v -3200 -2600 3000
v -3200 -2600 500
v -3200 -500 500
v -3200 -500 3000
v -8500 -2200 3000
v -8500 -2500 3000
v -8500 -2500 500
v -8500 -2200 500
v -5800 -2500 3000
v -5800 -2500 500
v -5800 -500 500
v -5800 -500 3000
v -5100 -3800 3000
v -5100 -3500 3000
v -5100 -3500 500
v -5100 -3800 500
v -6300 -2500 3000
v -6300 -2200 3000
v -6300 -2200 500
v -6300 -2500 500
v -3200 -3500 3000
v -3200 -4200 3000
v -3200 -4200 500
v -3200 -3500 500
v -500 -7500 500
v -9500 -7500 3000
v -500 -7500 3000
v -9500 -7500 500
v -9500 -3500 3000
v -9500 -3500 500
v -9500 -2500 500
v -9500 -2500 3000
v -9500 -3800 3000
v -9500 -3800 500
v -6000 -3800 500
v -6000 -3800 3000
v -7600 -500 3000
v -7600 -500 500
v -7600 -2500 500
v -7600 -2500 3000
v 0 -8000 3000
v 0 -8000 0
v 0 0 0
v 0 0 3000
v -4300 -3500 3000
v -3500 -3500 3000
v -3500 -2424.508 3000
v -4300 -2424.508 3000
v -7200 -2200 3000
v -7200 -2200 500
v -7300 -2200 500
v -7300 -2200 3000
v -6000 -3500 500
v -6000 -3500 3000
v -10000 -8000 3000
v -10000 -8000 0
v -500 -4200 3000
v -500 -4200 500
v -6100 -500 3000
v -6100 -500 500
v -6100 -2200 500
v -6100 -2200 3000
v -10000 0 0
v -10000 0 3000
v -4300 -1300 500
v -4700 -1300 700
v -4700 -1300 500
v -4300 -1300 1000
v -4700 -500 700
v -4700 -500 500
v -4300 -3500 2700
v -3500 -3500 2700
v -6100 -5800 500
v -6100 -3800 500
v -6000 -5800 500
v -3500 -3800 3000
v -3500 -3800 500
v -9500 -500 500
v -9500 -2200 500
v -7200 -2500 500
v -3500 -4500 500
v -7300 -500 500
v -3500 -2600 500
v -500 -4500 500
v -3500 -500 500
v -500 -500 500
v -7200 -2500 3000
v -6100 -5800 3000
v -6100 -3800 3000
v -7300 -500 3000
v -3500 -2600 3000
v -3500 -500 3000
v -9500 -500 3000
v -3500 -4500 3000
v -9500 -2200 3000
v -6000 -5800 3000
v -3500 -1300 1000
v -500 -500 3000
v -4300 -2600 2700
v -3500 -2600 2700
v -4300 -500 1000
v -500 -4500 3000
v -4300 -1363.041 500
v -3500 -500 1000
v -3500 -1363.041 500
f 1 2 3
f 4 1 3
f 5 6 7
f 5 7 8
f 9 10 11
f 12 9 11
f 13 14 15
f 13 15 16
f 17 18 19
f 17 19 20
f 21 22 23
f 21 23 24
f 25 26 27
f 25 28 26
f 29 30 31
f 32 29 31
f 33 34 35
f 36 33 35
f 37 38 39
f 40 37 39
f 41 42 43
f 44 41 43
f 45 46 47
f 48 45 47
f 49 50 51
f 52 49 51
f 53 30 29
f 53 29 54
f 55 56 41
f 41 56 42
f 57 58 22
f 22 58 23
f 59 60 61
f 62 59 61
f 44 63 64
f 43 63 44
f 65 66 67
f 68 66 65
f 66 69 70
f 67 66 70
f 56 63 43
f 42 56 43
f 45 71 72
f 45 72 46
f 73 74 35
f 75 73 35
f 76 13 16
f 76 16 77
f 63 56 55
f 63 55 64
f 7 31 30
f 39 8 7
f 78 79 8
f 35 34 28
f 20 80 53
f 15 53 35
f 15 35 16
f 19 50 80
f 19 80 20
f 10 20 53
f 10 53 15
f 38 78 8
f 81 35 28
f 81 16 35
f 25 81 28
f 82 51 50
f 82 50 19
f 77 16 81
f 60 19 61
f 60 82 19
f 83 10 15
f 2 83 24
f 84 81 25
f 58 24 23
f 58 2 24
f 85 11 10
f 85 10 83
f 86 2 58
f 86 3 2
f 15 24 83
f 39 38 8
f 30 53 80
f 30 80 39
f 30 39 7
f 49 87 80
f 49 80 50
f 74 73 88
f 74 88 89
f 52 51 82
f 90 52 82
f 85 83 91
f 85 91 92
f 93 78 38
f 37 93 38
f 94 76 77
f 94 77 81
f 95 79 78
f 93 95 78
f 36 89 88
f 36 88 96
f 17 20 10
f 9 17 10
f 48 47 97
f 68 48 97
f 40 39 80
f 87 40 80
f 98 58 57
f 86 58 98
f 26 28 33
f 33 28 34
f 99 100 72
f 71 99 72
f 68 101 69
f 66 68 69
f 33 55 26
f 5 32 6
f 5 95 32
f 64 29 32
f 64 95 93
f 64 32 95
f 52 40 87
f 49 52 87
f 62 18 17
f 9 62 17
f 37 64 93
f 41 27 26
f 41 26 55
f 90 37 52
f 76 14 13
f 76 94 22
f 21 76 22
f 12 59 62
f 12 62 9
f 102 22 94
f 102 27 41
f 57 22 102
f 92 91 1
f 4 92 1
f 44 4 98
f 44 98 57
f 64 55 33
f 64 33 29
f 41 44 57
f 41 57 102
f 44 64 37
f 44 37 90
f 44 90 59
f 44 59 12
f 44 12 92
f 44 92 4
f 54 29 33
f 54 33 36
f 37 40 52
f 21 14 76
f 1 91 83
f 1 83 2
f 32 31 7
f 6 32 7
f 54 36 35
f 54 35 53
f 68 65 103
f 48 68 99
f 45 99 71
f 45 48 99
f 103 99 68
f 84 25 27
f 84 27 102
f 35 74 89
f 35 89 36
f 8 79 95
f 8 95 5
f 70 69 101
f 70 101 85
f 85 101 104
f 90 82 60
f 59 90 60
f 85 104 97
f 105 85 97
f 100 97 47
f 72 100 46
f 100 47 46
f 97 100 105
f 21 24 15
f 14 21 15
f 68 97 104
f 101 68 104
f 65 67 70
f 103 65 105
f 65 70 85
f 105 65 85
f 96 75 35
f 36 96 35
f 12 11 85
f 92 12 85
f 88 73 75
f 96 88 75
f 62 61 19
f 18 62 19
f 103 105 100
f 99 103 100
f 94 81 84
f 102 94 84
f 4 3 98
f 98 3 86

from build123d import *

# Parameters (mm, degrees)
F0_W      = 10000
F0_H      = 8000
F1_DEPTH  = 3000
F2_T      = -500
F3_W      = 3500
F3_H      = 300
F3_W_2    = 300
F3_H_2    = 2100
F3_W_3    = 1000
F4_DEPTH  = 2500
F5_W      = 100
F5_H      = 2000
F6_DEPTH  = 2500
F8_DEPTH  = 800
F10_DEPTH = 800


with BuildPart() as f1:
    # F0 (on Top) → F1 (new body)
    with BuildSketch(Plane.XY):
        with Locations((-5000, -4000)):
            Rectangle(F0_W, F0_H)
    extrude(amount=F1_DEPTH)

    # F2
    f2_openings = [f1.faces().sort_by_distance(p)[0] for p in [
        (-5000, -4000, 3000),
    ]]
    offset(amount=F2_T, openings=f2_openings)

    # F3 (on face) → F4 (join, through all)
    with BuildSketch(Plane.XY.offset(500)):
        with Locations((-7750, -3650)):
            Rectangle(F3_W, F3_H)
        Polygon((-3500, -4500), (-500, -4500), (-500, -4200), (-3200, -4200), (-3200, -3500), (-5100, -3500), (-5100, -3800), (-3500, -3800), align=None)
        with Locations((-3350, -1550)):
            Rectangle(F3_W_2, F3_H_2)
        Polygon((-7300, -500), (-7600, -500), (-7600, -2500), (-7200, -2500), (-7200, -2200), (-7300, -2200), align=None)
        with Locations((-9000, -2350)):
            Rectangle(F3_W_3, F3_H)
        Polygon((-5800, -500), (-6100, -500), (-6100, -2200), (-6300, -2200), (-6300, -2500), (-5800, -2500), align=None)
    extrude(amount=F4_DEPTH)


with BuildPart() as f6:
    # F5 (on face) → F6 (new body, through all)
    with BuildSketch(Plane.XY.offset(500)):
        with Locations((-6050, -4800)):
            Rectangle(F5_W, F5_H)
    extrude(amount=F6_DEPTH)


with BuildPart() as f8:
    # F7 (on face) → F8 (new body)
    with BuildSketch(Plane(origin=(-3500, 0, 0), x_dir=(0, -1, 0), z_dir=(-1, 0, 0))):
        Polygon((500, 1000), (500, 500), (1363.0410452241, 500), (2600, 2700), (3500, 2700), (3500, 3000), (2424.5081407053, 3000), (1300, 1000), align=None)
    extrude(amount=F8_DEPTH)

    # F9 (on face) → F10 (join)
    with BuildSketch(Plane.XZ.offset(500)):
        Polygon((-4300, 500), (-4300, 1000), (-4700, 700), (-4700, 500), align=None)
    extrude(amount=F10_DEPTH)


solid = Compound([f1.part, f6.part, f8.part])
